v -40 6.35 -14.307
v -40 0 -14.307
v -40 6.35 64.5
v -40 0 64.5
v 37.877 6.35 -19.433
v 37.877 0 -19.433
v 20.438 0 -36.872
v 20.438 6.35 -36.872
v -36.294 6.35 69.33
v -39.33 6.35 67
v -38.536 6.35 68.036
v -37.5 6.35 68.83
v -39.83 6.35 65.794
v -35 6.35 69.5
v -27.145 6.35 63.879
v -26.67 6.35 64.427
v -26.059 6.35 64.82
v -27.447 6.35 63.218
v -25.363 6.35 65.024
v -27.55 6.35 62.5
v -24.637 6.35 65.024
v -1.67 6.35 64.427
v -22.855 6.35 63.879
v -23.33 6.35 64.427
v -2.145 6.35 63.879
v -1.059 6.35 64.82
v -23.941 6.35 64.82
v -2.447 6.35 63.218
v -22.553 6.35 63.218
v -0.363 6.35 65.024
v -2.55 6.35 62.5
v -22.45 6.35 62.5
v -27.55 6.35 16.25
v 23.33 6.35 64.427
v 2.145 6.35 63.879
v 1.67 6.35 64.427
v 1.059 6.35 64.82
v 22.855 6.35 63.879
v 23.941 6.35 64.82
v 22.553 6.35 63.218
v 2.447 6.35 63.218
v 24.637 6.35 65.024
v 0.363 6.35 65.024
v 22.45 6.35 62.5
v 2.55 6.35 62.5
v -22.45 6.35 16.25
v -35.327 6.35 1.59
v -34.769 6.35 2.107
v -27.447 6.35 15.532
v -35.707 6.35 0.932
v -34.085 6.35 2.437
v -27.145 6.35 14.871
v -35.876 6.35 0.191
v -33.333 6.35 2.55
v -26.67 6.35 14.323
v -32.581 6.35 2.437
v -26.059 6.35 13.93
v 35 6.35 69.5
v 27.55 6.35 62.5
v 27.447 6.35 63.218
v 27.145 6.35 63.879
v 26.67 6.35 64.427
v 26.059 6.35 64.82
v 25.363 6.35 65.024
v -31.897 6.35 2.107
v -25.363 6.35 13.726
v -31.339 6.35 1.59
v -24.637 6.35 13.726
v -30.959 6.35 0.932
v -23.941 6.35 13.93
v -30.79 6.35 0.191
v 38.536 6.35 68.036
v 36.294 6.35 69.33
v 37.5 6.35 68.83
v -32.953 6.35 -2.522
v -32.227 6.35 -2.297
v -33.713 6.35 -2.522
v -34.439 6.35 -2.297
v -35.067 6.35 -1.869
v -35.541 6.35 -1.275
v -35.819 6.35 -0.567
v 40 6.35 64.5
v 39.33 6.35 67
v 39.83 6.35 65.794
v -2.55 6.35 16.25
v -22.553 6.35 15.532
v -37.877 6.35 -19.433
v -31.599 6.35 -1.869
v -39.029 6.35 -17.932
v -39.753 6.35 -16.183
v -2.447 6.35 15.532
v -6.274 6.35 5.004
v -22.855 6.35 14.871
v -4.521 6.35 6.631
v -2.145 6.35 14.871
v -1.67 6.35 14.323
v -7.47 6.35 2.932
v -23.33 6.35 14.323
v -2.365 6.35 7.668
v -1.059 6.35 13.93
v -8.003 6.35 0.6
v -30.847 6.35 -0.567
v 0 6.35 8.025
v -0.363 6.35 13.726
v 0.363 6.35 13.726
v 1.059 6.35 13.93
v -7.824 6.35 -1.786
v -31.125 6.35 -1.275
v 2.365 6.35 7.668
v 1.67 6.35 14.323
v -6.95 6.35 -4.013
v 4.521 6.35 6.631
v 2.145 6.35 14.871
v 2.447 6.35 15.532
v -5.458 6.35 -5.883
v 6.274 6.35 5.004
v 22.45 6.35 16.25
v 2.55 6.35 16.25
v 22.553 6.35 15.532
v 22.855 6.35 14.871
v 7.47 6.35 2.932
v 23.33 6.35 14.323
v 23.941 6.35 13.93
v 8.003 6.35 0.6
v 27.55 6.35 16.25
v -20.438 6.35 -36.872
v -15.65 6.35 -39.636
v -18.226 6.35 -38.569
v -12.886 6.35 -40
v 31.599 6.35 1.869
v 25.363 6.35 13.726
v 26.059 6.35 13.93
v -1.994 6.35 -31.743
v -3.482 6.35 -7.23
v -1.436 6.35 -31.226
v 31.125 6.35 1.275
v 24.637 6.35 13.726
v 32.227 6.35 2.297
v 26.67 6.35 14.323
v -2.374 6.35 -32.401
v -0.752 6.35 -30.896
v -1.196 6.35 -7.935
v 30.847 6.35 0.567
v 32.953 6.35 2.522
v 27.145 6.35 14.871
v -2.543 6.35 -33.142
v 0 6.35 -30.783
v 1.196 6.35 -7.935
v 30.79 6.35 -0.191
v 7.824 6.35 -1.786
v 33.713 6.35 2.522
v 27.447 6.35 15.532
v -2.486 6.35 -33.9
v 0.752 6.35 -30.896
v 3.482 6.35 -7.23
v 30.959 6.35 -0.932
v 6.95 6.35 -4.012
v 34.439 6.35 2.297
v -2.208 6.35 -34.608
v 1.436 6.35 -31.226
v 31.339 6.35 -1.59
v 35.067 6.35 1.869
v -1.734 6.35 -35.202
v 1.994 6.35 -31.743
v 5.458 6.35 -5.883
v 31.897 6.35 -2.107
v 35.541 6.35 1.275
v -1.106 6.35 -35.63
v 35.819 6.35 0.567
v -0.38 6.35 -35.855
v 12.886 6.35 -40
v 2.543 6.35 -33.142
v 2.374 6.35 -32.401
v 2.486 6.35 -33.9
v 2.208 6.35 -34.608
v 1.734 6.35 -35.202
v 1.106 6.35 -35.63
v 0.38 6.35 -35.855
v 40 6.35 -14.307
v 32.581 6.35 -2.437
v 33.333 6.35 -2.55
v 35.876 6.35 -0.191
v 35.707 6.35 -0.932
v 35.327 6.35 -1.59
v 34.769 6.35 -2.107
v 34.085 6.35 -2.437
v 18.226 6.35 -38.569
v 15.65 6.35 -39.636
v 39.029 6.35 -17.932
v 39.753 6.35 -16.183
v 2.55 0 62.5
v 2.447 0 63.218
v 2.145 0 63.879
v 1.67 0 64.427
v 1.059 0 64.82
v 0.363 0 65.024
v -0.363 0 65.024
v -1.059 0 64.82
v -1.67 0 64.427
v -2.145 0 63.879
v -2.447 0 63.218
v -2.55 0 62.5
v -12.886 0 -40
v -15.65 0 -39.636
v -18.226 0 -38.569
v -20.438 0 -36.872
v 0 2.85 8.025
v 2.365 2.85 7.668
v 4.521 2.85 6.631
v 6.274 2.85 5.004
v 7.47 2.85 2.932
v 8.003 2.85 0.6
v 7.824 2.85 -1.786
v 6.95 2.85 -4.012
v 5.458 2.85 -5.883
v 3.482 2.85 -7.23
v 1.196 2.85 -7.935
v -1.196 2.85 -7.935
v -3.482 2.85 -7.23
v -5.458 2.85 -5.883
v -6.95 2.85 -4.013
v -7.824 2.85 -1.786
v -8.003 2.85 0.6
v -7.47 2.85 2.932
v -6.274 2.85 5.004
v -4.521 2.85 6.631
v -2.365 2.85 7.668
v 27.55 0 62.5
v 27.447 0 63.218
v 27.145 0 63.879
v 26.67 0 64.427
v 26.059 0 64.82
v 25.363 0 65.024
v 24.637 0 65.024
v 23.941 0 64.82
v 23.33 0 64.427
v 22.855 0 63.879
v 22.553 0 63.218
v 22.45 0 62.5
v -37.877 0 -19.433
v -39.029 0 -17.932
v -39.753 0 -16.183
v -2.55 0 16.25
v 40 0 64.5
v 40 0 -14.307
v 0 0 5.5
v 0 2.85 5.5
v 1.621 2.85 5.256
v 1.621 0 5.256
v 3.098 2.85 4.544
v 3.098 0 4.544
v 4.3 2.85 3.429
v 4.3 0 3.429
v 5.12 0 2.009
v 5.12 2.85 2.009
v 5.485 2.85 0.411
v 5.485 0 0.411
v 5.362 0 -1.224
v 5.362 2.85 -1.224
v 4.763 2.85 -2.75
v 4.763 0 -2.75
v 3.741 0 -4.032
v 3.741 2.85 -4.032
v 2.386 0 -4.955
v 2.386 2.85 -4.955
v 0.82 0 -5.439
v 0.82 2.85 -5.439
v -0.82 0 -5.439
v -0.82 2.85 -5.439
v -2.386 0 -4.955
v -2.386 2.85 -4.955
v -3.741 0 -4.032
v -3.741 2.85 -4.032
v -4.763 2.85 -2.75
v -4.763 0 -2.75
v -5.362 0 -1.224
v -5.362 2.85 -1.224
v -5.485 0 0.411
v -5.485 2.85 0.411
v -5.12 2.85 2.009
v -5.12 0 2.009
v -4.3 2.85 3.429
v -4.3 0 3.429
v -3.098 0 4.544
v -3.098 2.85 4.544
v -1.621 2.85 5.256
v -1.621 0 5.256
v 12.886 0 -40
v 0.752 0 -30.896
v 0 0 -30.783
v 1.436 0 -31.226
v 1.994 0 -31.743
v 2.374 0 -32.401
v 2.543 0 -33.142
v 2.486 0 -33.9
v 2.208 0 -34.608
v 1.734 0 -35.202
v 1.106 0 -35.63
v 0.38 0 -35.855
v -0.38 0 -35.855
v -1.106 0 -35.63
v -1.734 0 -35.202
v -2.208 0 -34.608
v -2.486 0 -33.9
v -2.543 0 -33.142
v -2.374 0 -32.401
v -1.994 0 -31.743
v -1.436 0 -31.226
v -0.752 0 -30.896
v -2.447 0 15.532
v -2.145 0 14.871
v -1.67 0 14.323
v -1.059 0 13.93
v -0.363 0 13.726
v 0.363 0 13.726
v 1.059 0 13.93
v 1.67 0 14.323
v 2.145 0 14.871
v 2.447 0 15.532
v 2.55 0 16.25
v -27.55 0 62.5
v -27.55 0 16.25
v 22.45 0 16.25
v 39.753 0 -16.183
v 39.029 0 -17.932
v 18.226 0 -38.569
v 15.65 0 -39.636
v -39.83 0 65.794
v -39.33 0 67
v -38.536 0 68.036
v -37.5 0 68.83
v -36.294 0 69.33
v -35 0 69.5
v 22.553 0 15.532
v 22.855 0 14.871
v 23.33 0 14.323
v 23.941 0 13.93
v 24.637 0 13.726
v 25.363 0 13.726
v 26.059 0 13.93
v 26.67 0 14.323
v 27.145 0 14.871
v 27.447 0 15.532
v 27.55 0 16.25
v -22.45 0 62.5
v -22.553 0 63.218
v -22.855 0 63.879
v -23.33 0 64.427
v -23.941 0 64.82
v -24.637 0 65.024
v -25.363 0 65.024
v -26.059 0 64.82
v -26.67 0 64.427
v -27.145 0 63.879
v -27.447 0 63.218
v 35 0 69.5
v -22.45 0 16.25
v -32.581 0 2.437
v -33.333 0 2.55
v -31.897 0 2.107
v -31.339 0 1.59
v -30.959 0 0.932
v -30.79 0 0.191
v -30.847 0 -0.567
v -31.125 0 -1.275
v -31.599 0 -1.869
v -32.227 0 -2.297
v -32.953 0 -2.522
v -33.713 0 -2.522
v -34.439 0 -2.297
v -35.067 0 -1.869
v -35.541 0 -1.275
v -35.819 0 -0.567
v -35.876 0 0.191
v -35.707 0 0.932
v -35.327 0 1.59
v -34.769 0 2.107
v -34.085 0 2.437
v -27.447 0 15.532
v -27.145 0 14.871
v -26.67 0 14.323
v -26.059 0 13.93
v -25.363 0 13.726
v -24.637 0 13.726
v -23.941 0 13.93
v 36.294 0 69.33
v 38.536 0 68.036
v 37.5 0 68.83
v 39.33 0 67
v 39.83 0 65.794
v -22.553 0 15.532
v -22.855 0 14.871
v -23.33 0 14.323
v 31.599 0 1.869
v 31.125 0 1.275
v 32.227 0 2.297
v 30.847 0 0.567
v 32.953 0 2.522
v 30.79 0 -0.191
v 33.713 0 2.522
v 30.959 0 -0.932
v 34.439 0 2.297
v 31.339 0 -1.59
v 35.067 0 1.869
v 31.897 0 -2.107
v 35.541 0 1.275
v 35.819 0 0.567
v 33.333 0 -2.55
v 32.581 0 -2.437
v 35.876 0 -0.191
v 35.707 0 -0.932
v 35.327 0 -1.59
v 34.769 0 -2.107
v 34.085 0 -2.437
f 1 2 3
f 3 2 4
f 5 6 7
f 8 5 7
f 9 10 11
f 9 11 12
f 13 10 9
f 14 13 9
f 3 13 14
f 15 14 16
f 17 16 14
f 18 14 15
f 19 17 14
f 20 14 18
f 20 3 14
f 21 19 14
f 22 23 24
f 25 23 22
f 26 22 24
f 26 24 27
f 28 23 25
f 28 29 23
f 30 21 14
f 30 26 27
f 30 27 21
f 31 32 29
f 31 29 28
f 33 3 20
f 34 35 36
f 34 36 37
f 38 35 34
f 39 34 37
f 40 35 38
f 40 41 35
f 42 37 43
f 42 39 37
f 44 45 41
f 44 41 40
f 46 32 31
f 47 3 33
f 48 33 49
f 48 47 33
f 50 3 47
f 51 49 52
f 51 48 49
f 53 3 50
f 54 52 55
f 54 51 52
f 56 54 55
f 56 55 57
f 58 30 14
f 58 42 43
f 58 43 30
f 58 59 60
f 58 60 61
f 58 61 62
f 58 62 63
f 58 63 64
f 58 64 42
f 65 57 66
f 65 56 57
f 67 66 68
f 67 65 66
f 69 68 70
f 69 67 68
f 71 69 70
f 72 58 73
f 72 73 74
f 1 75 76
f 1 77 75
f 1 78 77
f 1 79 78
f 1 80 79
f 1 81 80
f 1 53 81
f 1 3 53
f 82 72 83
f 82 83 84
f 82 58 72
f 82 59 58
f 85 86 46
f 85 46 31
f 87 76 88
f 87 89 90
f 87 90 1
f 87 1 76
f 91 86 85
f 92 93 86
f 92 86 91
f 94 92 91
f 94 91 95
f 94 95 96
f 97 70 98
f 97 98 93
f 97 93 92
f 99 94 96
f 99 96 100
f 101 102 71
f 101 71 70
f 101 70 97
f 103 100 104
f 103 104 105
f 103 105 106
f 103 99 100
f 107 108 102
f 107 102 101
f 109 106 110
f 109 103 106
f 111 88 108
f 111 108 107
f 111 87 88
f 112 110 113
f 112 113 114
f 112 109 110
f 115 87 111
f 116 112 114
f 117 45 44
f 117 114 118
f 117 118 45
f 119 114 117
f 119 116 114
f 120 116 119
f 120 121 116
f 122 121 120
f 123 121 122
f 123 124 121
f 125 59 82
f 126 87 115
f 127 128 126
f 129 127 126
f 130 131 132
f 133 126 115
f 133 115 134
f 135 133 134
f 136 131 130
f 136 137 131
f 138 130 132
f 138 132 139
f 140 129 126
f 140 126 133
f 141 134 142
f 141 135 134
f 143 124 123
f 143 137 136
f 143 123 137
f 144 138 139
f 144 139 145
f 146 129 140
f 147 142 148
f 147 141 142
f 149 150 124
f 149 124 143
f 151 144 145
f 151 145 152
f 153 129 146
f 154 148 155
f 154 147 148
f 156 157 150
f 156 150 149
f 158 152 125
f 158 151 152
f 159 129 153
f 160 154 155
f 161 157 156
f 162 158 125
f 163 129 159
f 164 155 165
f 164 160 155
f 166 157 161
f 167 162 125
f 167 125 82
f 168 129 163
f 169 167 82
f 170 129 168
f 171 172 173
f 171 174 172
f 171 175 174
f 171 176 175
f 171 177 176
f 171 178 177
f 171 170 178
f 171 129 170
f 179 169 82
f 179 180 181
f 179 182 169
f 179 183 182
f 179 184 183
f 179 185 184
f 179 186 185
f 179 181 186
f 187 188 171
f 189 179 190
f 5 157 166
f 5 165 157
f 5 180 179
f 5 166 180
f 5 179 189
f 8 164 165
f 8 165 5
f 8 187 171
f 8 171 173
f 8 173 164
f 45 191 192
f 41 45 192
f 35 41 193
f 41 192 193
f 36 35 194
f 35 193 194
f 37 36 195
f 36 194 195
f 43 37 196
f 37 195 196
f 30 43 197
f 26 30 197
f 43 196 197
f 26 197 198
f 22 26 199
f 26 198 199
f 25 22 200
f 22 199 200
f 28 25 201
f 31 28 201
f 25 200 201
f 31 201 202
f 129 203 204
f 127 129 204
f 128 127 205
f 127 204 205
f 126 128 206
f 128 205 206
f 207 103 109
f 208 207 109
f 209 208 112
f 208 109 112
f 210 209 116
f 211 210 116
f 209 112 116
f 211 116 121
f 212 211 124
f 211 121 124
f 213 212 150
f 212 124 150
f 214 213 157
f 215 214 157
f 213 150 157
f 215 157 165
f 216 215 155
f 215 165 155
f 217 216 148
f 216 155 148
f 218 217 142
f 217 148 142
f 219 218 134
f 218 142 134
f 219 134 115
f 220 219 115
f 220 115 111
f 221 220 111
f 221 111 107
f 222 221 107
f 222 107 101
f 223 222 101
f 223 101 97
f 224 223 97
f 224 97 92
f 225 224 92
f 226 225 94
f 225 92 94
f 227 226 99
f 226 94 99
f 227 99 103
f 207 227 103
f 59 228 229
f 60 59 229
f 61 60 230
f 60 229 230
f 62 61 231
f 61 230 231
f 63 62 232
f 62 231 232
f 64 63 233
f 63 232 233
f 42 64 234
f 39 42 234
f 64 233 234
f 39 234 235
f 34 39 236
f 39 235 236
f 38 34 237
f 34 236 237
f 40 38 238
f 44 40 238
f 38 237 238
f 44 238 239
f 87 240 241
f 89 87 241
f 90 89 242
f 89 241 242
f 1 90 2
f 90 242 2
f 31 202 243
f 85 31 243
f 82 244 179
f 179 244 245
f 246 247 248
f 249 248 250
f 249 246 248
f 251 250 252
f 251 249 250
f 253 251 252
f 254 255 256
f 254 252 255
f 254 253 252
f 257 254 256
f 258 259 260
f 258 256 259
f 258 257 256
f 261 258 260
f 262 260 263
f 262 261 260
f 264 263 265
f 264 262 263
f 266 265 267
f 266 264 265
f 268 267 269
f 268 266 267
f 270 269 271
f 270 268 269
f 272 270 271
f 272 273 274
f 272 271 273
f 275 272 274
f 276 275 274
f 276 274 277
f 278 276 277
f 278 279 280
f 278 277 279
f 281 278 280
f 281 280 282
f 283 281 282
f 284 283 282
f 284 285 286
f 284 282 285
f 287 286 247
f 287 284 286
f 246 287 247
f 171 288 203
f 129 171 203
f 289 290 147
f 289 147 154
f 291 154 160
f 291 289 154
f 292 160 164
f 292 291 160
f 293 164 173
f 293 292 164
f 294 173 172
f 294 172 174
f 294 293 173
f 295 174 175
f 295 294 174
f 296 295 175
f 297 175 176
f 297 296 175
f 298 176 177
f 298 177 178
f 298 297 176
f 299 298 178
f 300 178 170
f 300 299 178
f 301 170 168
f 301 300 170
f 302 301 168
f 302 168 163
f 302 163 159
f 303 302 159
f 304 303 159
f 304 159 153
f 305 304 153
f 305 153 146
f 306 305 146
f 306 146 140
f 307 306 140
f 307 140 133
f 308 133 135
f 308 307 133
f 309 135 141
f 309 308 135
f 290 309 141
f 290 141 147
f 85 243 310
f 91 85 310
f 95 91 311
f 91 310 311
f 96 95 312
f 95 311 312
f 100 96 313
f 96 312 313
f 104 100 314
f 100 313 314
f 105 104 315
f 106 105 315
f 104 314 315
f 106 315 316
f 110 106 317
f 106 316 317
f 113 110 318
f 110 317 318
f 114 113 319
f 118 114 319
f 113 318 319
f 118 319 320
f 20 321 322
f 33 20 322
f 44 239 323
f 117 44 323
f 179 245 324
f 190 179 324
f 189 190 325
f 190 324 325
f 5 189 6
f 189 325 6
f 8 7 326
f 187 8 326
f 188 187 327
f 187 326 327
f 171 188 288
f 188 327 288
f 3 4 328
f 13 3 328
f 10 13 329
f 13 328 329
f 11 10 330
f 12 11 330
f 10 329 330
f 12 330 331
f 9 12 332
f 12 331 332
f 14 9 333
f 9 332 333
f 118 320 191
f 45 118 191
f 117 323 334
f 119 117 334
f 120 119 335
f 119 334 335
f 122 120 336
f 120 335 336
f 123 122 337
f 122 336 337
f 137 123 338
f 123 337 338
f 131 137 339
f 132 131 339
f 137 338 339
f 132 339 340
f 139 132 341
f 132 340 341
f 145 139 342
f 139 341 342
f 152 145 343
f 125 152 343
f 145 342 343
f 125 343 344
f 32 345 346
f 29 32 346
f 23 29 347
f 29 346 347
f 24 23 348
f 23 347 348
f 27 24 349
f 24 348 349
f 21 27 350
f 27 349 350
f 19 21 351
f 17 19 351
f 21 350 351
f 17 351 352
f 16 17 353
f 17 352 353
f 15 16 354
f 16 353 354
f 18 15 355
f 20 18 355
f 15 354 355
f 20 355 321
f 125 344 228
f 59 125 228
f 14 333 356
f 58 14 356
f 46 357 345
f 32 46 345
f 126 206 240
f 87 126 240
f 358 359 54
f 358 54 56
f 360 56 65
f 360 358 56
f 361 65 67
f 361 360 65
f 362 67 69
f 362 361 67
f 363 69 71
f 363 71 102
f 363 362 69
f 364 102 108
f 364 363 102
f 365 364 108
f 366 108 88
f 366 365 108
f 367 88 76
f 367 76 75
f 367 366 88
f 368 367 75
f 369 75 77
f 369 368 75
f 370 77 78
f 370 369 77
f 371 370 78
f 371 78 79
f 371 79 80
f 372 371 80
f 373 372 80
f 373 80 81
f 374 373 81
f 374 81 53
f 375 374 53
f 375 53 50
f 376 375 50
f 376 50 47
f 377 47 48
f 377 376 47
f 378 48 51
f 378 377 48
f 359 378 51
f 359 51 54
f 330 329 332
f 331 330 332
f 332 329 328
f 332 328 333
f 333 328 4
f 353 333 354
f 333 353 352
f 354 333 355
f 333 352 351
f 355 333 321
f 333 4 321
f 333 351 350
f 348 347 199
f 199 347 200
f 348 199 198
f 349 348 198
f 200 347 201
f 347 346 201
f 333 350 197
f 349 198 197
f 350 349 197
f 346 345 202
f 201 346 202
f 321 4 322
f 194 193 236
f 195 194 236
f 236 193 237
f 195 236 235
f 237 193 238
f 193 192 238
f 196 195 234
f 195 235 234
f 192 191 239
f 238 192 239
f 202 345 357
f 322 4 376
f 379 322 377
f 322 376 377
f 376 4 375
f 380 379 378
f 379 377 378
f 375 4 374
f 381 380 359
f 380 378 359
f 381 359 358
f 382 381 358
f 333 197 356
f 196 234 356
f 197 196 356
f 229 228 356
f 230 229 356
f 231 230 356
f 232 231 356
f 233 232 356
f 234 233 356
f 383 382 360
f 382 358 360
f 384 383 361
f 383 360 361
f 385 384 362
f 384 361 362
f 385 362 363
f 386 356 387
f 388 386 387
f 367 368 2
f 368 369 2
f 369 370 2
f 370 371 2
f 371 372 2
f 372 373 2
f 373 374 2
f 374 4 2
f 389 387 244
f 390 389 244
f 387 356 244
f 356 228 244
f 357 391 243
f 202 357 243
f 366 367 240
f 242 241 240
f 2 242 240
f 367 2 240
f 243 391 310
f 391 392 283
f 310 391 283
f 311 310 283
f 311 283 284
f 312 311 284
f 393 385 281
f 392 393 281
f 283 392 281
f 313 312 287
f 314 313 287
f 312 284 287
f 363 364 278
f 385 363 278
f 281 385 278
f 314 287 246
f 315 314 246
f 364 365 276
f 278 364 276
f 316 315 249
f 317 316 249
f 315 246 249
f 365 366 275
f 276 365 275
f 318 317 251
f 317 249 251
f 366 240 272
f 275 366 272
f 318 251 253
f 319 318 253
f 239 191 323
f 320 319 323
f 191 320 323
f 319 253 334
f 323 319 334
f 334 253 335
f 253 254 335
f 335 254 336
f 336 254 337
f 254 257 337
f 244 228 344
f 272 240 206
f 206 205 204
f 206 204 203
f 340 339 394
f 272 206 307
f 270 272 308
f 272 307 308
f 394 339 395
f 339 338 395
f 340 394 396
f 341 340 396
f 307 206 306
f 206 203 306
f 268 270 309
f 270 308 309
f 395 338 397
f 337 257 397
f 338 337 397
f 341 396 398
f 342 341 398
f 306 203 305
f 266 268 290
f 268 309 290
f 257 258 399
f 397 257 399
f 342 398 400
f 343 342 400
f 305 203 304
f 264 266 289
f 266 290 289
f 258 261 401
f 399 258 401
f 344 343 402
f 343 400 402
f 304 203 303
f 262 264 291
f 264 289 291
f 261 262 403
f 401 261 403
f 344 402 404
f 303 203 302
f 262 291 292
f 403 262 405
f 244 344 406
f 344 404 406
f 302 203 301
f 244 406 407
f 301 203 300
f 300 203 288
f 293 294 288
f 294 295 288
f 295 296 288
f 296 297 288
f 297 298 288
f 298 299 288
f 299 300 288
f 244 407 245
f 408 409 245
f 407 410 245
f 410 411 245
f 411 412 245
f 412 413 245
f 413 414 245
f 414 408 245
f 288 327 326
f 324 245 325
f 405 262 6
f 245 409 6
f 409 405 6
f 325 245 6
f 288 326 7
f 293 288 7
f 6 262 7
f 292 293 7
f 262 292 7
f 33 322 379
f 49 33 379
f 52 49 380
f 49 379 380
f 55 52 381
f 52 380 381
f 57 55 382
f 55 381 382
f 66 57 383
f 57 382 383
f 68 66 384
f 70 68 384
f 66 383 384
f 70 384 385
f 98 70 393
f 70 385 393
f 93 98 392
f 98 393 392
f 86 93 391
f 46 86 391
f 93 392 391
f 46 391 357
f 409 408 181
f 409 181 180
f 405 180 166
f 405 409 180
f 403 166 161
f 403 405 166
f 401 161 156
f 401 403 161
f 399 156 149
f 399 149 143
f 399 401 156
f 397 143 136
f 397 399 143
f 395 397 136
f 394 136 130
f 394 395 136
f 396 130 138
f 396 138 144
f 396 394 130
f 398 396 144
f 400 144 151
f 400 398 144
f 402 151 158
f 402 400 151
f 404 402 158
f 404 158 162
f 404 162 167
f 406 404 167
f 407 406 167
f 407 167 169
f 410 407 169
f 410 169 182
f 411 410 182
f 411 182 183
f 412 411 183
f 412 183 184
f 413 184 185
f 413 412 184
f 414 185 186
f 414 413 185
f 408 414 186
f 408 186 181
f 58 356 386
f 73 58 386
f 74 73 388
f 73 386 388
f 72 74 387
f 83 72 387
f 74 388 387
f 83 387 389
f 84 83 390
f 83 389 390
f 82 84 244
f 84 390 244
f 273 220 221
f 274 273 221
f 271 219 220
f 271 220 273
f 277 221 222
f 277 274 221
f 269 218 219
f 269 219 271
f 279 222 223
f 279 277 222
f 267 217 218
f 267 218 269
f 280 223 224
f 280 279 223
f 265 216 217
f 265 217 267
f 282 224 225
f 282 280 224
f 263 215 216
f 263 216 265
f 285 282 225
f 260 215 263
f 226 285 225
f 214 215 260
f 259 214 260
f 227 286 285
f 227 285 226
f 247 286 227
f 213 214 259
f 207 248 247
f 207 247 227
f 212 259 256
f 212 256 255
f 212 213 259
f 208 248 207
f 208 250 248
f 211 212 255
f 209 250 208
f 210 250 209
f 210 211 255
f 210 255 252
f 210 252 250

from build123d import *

# Parameters (mm, degrees)
SKETCH1_R           = 5.5
SKETCH1_R_2         = 2.55
BOSS_EXTRUDE1_DEPTH = 6.35
SKETCH2_R           = 8.025
CUT_EXTRUDE1_DEPTH  = 3.5


with BuildPart() as part:
    # Sketch1 → Boss-Extrude1 (new body)
    with BuildSketch(Plane(origin=(0, 0, 0), x_dir=(1, 0, 0), z_dir=(0, 1, 0))):
        with BuildLine():
            Line((40, -27.5), (40, 14.306951673))
            ThreePointArc((40, 14.306951673), (39.448126611, 17.081406557), (37.876524164, 19.433475836))
            Line((37.876524164, 19.433475836), (20.438099577, 36.871900423))
            ThreePointArc((20.438099577, 36.871900423), (16.973258212, 39.187033407), (12.886199154, 40))
            Line((12.886199154, 40), (-12.886199154, 40))
            ThreePointArc((-12.886199154, 40), (-16.973258212, 39.187033407), (-20.438099577, 36.871900423))
            Line((-20.438099577, 36.871900423), (-37.876524164, 19.433475836))
            ThreePointArc((-37.876524164, 19.433475836), (-39.448126611, 17.081406557), (-40, 14.306951673))
            Line((-40, 14.306951673), (-40, -27.5))
            Line((-40, -27.5), (-40, -64.5))
            ThreePointArc((-40, -64.5), (-38.535533906, -68.035533906), (-35, -69.5))
            Line((-35, -69.5), (35, -69.5))
            ThreePointArc((35, -69.5), (38.535533906, -68.035533906), (40, -64.5))
            Line((40, -64.5), (40, -27.5))
        make_face()
        with Locations(Location((0, 0, 0), (0, 0, 270))):
            Circle(SKETCH1_R, mode=Mode.SUBTRACT)
        with Locations(Location((-33.333013665, 0, 0), (0, 0, 270))):
            Circle(SKETCH1_R_2, mode=Mode.SUBTRACT)
        with Locations(Location((0, 33.333013665, 0), (0, 0, 270))):
            Circle(SKETCH1_R_2, mode=Mode.SUBTRACT)
        with Locations(Location((33.333013665, 0, 0), (0, 0, 90))):
            Circle(SKETCH1_R_2, mode=Mode.SUBTRACT)
        with BuildLine():
            Line((22.45, -62.5), (22.45, -16.25))
            ThreePointArc((22.45, -16.25), (25, -13.7), (27.55, -16.25))
            Line((27.55, -16.25), (27.55, -62.5))
            ThreePointArc((27.55, -62.5), (25, -65.05), (22.45, -62.5))
        make_face(mode=Mode.SUBTRACT)
        with BuildLine():
            Line((-2.55, -62.5), (-2.55, -16.25))
            ThreePointArc((-2.55, -16.25), (0, -13.7), (2.55, -16.25))
            Line((2.55, -16.25), (2.55, -62.5))
            ThreePointArc((2.55, -62.5), (0, -65.05), (-2.55, -62.5))
        make_face(mode=Mode.SUBTRACT)
        with BuildLine():
            Line((-27.55, -62.5), (-27.55, -16.25))
            ThreePointArc((-27.55, -16.25), (-25, -13.7), (-22.45, -16.25))
            Line((-22.45, -16.25), (-22.45, -62.5))
            ThreePointArc((-22.45, -62.5), (-25, -65.05), (-27.55, -62.5))
        make_face(mode=Mode.SUBTRACT)
    extrude(amount=BOSS_EXTRUDE1_DEPTH)

    # Sketch2 → Cut-Extrude1 (cut)
    with BuildSketch(Plane(origin=(0, 6.35, 0), x_dir=(1, 0, 0), z_dir=(0, 1, 0))):
        with Locations(Location((0, 0, 0), (0, 0, 270))):
            Circle(SKETCH2_R)
    extrude(amount=-CUT_EXTRUDE1_DEPTH, mode=Mode.SUBTRACT)


solid = part.part
